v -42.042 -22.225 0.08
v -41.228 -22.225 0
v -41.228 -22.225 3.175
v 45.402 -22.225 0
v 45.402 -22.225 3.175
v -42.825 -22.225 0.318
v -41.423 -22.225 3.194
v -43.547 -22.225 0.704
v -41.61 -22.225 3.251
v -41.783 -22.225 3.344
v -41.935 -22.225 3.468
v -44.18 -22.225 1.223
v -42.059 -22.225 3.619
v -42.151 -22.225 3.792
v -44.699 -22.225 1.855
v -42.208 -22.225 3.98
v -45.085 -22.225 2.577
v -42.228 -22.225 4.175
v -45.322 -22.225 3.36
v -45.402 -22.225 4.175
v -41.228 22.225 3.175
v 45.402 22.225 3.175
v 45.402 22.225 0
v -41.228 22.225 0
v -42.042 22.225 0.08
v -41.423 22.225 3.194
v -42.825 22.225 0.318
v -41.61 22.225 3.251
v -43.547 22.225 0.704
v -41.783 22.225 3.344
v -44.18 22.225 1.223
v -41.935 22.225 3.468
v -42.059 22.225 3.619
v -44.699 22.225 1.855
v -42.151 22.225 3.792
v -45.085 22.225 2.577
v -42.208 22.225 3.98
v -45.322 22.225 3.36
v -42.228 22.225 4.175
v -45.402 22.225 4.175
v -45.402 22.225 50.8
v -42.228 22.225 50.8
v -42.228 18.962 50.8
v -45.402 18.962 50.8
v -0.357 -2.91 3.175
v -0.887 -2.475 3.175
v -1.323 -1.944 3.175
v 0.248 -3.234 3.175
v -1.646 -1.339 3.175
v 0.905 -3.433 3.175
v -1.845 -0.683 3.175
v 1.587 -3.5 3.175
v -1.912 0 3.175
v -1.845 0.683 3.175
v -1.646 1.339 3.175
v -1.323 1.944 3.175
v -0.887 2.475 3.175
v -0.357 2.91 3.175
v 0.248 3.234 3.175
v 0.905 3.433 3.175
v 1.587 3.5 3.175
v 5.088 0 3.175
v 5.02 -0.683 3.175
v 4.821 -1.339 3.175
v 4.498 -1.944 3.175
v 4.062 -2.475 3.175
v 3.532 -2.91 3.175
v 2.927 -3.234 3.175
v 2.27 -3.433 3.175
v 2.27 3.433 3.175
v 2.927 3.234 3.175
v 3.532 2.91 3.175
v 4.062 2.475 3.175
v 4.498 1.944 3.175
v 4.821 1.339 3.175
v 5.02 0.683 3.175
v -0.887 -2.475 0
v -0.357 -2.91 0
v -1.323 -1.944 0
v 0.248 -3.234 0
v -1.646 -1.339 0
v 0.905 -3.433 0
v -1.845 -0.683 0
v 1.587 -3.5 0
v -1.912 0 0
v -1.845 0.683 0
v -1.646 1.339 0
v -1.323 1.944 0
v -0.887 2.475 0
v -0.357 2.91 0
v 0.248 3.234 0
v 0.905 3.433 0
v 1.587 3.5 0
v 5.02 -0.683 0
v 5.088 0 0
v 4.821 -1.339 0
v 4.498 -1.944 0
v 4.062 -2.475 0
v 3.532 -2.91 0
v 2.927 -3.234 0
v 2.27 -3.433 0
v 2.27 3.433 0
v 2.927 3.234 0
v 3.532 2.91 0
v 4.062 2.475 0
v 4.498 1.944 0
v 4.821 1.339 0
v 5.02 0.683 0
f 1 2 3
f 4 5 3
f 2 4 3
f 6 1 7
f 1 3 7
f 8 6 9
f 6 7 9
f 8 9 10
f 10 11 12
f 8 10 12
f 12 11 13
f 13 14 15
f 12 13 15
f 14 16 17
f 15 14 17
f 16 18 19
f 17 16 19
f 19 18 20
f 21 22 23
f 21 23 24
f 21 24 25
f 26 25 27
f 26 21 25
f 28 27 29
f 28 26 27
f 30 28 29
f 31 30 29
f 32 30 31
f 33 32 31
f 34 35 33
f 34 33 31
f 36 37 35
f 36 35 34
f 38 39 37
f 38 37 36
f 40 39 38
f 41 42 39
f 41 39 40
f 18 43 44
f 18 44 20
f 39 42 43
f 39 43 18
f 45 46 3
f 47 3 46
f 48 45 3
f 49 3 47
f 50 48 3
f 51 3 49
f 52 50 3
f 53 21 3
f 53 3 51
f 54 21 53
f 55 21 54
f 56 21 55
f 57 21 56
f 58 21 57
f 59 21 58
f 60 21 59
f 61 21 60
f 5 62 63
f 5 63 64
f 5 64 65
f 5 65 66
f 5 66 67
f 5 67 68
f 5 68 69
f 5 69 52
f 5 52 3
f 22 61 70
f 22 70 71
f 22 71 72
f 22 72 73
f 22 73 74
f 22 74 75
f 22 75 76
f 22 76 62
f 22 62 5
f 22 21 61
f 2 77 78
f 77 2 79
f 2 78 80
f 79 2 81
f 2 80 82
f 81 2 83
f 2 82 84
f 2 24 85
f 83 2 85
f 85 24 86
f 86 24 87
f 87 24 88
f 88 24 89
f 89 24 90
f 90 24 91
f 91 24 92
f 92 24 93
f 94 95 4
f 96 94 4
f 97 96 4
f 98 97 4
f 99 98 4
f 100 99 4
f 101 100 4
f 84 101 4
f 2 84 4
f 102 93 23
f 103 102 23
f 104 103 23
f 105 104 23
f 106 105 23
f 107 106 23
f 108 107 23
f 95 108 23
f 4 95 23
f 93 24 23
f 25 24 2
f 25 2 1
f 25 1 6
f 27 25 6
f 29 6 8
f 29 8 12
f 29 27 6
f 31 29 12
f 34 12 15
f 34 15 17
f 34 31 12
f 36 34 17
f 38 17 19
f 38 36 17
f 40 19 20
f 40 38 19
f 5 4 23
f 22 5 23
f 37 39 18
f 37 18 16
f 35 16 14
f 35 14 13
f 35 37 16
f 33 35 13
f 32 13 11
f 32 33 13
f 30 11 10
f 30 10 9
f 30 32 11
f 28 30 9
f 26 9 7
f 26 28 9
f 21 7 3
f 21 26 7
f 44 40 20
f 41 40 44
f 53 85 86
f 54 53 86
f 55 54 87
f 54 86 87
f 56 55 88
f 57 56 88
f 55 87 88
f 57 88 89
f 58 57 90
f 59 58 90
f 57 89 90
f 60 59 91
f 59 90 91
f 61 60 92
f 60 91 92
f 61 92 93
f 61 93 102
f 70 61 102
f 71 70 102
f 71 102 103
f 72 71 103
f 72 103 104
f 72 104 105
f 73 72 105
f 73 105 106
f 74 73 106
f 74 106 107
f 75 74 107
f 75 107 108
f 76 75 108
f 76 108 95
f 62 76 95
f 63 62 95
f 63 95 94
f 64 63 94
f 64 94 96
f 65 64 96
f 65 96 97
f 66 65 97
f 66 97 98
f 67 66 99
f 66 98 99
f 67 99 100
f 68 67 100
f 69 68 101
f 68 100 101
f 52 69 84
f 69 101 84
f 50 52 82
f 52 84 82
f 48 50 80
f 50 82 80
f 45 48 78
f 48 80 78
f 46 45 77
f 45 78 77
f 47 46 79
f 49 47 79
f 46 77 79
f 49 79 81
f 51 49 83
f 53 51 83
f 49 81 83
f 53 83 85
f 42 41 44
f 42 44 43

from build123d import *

# Parameters (mm, degrees)
SKETCH1_W                    = 90.805
SKETCH1_H                    = 44.45
BASE_FLANGE1_DEPTH           = 3.175
EDGE_FLANGE1_STRIP_W         = 14.7
EDGE_FLANGE1_STRIP_H         = 3.175
EDGE_FLANGE1_STRIP_CUT_DEPTH = 44.45
EDGE_FLANGE1_DEPTH           = 44.45
CUT_EXTRUDE1_DEPTH           = 107.396140203
CUT_EXTRUDE1_DEPTH_BACK      = 3.175
M6_CLEARANCE_HOLE3_D         = 7


# Sheet-metal steps are written as plain solids
with BuildPart() as part:
    # Sketch1 → Base-Flange1 (new body)
    with BuildSketch(Plane.XY):
        Rectangle(SKETCH1_W, SKETCH1_H)
    extrude(amount=BASE_FLANGE1_DEPTH)

    # Edge-Flange1 strip (across the edge) → Edge-Flange1 strip cut (cut)
    with BuildSketch(Plane(origin=(-45.4025, 22.225, 3.175), x_dir=(1, 0, 0), z_dir=(0, -1, 0))):
        with Locations((-3.175, -1.5875)):
            Rectangle(EDGE_FLANGE1_STRIP_W, EDGE_FLANGE1_STRIP_H)
    extrude(amount=EDGE_FLANGE1_STRIP_CUT_DEPTH, mode=Mode.SUBTRACT)

    # Edge-Flange1 section (across the edge) → Edge-Flange1 (add)
    with BuildSketch(Plane(origin=(-45.4025, 22.225, 3.175), x_dir=(1, 0, 0), z_dir=(0, -1, 0))):
        with BuildLine():
            Line((0, 1), (0, 47.625))
            Line((0, 47.625), (3.175, 47.625))
            Line((3.175, 47.625), (3.175, 1))
            ThreePointArc((3.175, 1), (3.467893219, 0.292893219), (4.175, 0))
            Line((4.175, 0), (4.175, -3.175))
            ThreePointArc((4.175, -3.175), (1.222829189, -1.952170811), (0, 1))
        make_face()
    extrude(amount=EDGE_FLANGE1_DEPTH)

    # Sketch9 → Cut-Extrude1 (cut, two sides: drawn at the far end of the back side and taken through both)
    with BuildSketch(Plane.ZY.offset(45.4025).offset(-CUT_EXTRUDE1_DEPTH_BACK)):
        Polygon((50.8, 167.227851822), (50.8, 22.225), (50.8, 18.96237), (4.175, -22.225), (-104.498494033, -118.224472556), (150.247183568, -256.81721367), (305.545677601, 28.635110708), align=None)
    extrude(amount=CUT_EXTRUDE1_DEPTH + CUT_EXTRUDE1_DEPTH_BACK, mode=Mode.SUBTRACT)

    # M6 Clearance Hole3 (through all)
    with Locations(Plane.XY.offset(3.175)):
        with Locations((1.5875, 0)):
            Hole(M6_CLEARANCE_HOLE3_D / 2)


solid = part.part
